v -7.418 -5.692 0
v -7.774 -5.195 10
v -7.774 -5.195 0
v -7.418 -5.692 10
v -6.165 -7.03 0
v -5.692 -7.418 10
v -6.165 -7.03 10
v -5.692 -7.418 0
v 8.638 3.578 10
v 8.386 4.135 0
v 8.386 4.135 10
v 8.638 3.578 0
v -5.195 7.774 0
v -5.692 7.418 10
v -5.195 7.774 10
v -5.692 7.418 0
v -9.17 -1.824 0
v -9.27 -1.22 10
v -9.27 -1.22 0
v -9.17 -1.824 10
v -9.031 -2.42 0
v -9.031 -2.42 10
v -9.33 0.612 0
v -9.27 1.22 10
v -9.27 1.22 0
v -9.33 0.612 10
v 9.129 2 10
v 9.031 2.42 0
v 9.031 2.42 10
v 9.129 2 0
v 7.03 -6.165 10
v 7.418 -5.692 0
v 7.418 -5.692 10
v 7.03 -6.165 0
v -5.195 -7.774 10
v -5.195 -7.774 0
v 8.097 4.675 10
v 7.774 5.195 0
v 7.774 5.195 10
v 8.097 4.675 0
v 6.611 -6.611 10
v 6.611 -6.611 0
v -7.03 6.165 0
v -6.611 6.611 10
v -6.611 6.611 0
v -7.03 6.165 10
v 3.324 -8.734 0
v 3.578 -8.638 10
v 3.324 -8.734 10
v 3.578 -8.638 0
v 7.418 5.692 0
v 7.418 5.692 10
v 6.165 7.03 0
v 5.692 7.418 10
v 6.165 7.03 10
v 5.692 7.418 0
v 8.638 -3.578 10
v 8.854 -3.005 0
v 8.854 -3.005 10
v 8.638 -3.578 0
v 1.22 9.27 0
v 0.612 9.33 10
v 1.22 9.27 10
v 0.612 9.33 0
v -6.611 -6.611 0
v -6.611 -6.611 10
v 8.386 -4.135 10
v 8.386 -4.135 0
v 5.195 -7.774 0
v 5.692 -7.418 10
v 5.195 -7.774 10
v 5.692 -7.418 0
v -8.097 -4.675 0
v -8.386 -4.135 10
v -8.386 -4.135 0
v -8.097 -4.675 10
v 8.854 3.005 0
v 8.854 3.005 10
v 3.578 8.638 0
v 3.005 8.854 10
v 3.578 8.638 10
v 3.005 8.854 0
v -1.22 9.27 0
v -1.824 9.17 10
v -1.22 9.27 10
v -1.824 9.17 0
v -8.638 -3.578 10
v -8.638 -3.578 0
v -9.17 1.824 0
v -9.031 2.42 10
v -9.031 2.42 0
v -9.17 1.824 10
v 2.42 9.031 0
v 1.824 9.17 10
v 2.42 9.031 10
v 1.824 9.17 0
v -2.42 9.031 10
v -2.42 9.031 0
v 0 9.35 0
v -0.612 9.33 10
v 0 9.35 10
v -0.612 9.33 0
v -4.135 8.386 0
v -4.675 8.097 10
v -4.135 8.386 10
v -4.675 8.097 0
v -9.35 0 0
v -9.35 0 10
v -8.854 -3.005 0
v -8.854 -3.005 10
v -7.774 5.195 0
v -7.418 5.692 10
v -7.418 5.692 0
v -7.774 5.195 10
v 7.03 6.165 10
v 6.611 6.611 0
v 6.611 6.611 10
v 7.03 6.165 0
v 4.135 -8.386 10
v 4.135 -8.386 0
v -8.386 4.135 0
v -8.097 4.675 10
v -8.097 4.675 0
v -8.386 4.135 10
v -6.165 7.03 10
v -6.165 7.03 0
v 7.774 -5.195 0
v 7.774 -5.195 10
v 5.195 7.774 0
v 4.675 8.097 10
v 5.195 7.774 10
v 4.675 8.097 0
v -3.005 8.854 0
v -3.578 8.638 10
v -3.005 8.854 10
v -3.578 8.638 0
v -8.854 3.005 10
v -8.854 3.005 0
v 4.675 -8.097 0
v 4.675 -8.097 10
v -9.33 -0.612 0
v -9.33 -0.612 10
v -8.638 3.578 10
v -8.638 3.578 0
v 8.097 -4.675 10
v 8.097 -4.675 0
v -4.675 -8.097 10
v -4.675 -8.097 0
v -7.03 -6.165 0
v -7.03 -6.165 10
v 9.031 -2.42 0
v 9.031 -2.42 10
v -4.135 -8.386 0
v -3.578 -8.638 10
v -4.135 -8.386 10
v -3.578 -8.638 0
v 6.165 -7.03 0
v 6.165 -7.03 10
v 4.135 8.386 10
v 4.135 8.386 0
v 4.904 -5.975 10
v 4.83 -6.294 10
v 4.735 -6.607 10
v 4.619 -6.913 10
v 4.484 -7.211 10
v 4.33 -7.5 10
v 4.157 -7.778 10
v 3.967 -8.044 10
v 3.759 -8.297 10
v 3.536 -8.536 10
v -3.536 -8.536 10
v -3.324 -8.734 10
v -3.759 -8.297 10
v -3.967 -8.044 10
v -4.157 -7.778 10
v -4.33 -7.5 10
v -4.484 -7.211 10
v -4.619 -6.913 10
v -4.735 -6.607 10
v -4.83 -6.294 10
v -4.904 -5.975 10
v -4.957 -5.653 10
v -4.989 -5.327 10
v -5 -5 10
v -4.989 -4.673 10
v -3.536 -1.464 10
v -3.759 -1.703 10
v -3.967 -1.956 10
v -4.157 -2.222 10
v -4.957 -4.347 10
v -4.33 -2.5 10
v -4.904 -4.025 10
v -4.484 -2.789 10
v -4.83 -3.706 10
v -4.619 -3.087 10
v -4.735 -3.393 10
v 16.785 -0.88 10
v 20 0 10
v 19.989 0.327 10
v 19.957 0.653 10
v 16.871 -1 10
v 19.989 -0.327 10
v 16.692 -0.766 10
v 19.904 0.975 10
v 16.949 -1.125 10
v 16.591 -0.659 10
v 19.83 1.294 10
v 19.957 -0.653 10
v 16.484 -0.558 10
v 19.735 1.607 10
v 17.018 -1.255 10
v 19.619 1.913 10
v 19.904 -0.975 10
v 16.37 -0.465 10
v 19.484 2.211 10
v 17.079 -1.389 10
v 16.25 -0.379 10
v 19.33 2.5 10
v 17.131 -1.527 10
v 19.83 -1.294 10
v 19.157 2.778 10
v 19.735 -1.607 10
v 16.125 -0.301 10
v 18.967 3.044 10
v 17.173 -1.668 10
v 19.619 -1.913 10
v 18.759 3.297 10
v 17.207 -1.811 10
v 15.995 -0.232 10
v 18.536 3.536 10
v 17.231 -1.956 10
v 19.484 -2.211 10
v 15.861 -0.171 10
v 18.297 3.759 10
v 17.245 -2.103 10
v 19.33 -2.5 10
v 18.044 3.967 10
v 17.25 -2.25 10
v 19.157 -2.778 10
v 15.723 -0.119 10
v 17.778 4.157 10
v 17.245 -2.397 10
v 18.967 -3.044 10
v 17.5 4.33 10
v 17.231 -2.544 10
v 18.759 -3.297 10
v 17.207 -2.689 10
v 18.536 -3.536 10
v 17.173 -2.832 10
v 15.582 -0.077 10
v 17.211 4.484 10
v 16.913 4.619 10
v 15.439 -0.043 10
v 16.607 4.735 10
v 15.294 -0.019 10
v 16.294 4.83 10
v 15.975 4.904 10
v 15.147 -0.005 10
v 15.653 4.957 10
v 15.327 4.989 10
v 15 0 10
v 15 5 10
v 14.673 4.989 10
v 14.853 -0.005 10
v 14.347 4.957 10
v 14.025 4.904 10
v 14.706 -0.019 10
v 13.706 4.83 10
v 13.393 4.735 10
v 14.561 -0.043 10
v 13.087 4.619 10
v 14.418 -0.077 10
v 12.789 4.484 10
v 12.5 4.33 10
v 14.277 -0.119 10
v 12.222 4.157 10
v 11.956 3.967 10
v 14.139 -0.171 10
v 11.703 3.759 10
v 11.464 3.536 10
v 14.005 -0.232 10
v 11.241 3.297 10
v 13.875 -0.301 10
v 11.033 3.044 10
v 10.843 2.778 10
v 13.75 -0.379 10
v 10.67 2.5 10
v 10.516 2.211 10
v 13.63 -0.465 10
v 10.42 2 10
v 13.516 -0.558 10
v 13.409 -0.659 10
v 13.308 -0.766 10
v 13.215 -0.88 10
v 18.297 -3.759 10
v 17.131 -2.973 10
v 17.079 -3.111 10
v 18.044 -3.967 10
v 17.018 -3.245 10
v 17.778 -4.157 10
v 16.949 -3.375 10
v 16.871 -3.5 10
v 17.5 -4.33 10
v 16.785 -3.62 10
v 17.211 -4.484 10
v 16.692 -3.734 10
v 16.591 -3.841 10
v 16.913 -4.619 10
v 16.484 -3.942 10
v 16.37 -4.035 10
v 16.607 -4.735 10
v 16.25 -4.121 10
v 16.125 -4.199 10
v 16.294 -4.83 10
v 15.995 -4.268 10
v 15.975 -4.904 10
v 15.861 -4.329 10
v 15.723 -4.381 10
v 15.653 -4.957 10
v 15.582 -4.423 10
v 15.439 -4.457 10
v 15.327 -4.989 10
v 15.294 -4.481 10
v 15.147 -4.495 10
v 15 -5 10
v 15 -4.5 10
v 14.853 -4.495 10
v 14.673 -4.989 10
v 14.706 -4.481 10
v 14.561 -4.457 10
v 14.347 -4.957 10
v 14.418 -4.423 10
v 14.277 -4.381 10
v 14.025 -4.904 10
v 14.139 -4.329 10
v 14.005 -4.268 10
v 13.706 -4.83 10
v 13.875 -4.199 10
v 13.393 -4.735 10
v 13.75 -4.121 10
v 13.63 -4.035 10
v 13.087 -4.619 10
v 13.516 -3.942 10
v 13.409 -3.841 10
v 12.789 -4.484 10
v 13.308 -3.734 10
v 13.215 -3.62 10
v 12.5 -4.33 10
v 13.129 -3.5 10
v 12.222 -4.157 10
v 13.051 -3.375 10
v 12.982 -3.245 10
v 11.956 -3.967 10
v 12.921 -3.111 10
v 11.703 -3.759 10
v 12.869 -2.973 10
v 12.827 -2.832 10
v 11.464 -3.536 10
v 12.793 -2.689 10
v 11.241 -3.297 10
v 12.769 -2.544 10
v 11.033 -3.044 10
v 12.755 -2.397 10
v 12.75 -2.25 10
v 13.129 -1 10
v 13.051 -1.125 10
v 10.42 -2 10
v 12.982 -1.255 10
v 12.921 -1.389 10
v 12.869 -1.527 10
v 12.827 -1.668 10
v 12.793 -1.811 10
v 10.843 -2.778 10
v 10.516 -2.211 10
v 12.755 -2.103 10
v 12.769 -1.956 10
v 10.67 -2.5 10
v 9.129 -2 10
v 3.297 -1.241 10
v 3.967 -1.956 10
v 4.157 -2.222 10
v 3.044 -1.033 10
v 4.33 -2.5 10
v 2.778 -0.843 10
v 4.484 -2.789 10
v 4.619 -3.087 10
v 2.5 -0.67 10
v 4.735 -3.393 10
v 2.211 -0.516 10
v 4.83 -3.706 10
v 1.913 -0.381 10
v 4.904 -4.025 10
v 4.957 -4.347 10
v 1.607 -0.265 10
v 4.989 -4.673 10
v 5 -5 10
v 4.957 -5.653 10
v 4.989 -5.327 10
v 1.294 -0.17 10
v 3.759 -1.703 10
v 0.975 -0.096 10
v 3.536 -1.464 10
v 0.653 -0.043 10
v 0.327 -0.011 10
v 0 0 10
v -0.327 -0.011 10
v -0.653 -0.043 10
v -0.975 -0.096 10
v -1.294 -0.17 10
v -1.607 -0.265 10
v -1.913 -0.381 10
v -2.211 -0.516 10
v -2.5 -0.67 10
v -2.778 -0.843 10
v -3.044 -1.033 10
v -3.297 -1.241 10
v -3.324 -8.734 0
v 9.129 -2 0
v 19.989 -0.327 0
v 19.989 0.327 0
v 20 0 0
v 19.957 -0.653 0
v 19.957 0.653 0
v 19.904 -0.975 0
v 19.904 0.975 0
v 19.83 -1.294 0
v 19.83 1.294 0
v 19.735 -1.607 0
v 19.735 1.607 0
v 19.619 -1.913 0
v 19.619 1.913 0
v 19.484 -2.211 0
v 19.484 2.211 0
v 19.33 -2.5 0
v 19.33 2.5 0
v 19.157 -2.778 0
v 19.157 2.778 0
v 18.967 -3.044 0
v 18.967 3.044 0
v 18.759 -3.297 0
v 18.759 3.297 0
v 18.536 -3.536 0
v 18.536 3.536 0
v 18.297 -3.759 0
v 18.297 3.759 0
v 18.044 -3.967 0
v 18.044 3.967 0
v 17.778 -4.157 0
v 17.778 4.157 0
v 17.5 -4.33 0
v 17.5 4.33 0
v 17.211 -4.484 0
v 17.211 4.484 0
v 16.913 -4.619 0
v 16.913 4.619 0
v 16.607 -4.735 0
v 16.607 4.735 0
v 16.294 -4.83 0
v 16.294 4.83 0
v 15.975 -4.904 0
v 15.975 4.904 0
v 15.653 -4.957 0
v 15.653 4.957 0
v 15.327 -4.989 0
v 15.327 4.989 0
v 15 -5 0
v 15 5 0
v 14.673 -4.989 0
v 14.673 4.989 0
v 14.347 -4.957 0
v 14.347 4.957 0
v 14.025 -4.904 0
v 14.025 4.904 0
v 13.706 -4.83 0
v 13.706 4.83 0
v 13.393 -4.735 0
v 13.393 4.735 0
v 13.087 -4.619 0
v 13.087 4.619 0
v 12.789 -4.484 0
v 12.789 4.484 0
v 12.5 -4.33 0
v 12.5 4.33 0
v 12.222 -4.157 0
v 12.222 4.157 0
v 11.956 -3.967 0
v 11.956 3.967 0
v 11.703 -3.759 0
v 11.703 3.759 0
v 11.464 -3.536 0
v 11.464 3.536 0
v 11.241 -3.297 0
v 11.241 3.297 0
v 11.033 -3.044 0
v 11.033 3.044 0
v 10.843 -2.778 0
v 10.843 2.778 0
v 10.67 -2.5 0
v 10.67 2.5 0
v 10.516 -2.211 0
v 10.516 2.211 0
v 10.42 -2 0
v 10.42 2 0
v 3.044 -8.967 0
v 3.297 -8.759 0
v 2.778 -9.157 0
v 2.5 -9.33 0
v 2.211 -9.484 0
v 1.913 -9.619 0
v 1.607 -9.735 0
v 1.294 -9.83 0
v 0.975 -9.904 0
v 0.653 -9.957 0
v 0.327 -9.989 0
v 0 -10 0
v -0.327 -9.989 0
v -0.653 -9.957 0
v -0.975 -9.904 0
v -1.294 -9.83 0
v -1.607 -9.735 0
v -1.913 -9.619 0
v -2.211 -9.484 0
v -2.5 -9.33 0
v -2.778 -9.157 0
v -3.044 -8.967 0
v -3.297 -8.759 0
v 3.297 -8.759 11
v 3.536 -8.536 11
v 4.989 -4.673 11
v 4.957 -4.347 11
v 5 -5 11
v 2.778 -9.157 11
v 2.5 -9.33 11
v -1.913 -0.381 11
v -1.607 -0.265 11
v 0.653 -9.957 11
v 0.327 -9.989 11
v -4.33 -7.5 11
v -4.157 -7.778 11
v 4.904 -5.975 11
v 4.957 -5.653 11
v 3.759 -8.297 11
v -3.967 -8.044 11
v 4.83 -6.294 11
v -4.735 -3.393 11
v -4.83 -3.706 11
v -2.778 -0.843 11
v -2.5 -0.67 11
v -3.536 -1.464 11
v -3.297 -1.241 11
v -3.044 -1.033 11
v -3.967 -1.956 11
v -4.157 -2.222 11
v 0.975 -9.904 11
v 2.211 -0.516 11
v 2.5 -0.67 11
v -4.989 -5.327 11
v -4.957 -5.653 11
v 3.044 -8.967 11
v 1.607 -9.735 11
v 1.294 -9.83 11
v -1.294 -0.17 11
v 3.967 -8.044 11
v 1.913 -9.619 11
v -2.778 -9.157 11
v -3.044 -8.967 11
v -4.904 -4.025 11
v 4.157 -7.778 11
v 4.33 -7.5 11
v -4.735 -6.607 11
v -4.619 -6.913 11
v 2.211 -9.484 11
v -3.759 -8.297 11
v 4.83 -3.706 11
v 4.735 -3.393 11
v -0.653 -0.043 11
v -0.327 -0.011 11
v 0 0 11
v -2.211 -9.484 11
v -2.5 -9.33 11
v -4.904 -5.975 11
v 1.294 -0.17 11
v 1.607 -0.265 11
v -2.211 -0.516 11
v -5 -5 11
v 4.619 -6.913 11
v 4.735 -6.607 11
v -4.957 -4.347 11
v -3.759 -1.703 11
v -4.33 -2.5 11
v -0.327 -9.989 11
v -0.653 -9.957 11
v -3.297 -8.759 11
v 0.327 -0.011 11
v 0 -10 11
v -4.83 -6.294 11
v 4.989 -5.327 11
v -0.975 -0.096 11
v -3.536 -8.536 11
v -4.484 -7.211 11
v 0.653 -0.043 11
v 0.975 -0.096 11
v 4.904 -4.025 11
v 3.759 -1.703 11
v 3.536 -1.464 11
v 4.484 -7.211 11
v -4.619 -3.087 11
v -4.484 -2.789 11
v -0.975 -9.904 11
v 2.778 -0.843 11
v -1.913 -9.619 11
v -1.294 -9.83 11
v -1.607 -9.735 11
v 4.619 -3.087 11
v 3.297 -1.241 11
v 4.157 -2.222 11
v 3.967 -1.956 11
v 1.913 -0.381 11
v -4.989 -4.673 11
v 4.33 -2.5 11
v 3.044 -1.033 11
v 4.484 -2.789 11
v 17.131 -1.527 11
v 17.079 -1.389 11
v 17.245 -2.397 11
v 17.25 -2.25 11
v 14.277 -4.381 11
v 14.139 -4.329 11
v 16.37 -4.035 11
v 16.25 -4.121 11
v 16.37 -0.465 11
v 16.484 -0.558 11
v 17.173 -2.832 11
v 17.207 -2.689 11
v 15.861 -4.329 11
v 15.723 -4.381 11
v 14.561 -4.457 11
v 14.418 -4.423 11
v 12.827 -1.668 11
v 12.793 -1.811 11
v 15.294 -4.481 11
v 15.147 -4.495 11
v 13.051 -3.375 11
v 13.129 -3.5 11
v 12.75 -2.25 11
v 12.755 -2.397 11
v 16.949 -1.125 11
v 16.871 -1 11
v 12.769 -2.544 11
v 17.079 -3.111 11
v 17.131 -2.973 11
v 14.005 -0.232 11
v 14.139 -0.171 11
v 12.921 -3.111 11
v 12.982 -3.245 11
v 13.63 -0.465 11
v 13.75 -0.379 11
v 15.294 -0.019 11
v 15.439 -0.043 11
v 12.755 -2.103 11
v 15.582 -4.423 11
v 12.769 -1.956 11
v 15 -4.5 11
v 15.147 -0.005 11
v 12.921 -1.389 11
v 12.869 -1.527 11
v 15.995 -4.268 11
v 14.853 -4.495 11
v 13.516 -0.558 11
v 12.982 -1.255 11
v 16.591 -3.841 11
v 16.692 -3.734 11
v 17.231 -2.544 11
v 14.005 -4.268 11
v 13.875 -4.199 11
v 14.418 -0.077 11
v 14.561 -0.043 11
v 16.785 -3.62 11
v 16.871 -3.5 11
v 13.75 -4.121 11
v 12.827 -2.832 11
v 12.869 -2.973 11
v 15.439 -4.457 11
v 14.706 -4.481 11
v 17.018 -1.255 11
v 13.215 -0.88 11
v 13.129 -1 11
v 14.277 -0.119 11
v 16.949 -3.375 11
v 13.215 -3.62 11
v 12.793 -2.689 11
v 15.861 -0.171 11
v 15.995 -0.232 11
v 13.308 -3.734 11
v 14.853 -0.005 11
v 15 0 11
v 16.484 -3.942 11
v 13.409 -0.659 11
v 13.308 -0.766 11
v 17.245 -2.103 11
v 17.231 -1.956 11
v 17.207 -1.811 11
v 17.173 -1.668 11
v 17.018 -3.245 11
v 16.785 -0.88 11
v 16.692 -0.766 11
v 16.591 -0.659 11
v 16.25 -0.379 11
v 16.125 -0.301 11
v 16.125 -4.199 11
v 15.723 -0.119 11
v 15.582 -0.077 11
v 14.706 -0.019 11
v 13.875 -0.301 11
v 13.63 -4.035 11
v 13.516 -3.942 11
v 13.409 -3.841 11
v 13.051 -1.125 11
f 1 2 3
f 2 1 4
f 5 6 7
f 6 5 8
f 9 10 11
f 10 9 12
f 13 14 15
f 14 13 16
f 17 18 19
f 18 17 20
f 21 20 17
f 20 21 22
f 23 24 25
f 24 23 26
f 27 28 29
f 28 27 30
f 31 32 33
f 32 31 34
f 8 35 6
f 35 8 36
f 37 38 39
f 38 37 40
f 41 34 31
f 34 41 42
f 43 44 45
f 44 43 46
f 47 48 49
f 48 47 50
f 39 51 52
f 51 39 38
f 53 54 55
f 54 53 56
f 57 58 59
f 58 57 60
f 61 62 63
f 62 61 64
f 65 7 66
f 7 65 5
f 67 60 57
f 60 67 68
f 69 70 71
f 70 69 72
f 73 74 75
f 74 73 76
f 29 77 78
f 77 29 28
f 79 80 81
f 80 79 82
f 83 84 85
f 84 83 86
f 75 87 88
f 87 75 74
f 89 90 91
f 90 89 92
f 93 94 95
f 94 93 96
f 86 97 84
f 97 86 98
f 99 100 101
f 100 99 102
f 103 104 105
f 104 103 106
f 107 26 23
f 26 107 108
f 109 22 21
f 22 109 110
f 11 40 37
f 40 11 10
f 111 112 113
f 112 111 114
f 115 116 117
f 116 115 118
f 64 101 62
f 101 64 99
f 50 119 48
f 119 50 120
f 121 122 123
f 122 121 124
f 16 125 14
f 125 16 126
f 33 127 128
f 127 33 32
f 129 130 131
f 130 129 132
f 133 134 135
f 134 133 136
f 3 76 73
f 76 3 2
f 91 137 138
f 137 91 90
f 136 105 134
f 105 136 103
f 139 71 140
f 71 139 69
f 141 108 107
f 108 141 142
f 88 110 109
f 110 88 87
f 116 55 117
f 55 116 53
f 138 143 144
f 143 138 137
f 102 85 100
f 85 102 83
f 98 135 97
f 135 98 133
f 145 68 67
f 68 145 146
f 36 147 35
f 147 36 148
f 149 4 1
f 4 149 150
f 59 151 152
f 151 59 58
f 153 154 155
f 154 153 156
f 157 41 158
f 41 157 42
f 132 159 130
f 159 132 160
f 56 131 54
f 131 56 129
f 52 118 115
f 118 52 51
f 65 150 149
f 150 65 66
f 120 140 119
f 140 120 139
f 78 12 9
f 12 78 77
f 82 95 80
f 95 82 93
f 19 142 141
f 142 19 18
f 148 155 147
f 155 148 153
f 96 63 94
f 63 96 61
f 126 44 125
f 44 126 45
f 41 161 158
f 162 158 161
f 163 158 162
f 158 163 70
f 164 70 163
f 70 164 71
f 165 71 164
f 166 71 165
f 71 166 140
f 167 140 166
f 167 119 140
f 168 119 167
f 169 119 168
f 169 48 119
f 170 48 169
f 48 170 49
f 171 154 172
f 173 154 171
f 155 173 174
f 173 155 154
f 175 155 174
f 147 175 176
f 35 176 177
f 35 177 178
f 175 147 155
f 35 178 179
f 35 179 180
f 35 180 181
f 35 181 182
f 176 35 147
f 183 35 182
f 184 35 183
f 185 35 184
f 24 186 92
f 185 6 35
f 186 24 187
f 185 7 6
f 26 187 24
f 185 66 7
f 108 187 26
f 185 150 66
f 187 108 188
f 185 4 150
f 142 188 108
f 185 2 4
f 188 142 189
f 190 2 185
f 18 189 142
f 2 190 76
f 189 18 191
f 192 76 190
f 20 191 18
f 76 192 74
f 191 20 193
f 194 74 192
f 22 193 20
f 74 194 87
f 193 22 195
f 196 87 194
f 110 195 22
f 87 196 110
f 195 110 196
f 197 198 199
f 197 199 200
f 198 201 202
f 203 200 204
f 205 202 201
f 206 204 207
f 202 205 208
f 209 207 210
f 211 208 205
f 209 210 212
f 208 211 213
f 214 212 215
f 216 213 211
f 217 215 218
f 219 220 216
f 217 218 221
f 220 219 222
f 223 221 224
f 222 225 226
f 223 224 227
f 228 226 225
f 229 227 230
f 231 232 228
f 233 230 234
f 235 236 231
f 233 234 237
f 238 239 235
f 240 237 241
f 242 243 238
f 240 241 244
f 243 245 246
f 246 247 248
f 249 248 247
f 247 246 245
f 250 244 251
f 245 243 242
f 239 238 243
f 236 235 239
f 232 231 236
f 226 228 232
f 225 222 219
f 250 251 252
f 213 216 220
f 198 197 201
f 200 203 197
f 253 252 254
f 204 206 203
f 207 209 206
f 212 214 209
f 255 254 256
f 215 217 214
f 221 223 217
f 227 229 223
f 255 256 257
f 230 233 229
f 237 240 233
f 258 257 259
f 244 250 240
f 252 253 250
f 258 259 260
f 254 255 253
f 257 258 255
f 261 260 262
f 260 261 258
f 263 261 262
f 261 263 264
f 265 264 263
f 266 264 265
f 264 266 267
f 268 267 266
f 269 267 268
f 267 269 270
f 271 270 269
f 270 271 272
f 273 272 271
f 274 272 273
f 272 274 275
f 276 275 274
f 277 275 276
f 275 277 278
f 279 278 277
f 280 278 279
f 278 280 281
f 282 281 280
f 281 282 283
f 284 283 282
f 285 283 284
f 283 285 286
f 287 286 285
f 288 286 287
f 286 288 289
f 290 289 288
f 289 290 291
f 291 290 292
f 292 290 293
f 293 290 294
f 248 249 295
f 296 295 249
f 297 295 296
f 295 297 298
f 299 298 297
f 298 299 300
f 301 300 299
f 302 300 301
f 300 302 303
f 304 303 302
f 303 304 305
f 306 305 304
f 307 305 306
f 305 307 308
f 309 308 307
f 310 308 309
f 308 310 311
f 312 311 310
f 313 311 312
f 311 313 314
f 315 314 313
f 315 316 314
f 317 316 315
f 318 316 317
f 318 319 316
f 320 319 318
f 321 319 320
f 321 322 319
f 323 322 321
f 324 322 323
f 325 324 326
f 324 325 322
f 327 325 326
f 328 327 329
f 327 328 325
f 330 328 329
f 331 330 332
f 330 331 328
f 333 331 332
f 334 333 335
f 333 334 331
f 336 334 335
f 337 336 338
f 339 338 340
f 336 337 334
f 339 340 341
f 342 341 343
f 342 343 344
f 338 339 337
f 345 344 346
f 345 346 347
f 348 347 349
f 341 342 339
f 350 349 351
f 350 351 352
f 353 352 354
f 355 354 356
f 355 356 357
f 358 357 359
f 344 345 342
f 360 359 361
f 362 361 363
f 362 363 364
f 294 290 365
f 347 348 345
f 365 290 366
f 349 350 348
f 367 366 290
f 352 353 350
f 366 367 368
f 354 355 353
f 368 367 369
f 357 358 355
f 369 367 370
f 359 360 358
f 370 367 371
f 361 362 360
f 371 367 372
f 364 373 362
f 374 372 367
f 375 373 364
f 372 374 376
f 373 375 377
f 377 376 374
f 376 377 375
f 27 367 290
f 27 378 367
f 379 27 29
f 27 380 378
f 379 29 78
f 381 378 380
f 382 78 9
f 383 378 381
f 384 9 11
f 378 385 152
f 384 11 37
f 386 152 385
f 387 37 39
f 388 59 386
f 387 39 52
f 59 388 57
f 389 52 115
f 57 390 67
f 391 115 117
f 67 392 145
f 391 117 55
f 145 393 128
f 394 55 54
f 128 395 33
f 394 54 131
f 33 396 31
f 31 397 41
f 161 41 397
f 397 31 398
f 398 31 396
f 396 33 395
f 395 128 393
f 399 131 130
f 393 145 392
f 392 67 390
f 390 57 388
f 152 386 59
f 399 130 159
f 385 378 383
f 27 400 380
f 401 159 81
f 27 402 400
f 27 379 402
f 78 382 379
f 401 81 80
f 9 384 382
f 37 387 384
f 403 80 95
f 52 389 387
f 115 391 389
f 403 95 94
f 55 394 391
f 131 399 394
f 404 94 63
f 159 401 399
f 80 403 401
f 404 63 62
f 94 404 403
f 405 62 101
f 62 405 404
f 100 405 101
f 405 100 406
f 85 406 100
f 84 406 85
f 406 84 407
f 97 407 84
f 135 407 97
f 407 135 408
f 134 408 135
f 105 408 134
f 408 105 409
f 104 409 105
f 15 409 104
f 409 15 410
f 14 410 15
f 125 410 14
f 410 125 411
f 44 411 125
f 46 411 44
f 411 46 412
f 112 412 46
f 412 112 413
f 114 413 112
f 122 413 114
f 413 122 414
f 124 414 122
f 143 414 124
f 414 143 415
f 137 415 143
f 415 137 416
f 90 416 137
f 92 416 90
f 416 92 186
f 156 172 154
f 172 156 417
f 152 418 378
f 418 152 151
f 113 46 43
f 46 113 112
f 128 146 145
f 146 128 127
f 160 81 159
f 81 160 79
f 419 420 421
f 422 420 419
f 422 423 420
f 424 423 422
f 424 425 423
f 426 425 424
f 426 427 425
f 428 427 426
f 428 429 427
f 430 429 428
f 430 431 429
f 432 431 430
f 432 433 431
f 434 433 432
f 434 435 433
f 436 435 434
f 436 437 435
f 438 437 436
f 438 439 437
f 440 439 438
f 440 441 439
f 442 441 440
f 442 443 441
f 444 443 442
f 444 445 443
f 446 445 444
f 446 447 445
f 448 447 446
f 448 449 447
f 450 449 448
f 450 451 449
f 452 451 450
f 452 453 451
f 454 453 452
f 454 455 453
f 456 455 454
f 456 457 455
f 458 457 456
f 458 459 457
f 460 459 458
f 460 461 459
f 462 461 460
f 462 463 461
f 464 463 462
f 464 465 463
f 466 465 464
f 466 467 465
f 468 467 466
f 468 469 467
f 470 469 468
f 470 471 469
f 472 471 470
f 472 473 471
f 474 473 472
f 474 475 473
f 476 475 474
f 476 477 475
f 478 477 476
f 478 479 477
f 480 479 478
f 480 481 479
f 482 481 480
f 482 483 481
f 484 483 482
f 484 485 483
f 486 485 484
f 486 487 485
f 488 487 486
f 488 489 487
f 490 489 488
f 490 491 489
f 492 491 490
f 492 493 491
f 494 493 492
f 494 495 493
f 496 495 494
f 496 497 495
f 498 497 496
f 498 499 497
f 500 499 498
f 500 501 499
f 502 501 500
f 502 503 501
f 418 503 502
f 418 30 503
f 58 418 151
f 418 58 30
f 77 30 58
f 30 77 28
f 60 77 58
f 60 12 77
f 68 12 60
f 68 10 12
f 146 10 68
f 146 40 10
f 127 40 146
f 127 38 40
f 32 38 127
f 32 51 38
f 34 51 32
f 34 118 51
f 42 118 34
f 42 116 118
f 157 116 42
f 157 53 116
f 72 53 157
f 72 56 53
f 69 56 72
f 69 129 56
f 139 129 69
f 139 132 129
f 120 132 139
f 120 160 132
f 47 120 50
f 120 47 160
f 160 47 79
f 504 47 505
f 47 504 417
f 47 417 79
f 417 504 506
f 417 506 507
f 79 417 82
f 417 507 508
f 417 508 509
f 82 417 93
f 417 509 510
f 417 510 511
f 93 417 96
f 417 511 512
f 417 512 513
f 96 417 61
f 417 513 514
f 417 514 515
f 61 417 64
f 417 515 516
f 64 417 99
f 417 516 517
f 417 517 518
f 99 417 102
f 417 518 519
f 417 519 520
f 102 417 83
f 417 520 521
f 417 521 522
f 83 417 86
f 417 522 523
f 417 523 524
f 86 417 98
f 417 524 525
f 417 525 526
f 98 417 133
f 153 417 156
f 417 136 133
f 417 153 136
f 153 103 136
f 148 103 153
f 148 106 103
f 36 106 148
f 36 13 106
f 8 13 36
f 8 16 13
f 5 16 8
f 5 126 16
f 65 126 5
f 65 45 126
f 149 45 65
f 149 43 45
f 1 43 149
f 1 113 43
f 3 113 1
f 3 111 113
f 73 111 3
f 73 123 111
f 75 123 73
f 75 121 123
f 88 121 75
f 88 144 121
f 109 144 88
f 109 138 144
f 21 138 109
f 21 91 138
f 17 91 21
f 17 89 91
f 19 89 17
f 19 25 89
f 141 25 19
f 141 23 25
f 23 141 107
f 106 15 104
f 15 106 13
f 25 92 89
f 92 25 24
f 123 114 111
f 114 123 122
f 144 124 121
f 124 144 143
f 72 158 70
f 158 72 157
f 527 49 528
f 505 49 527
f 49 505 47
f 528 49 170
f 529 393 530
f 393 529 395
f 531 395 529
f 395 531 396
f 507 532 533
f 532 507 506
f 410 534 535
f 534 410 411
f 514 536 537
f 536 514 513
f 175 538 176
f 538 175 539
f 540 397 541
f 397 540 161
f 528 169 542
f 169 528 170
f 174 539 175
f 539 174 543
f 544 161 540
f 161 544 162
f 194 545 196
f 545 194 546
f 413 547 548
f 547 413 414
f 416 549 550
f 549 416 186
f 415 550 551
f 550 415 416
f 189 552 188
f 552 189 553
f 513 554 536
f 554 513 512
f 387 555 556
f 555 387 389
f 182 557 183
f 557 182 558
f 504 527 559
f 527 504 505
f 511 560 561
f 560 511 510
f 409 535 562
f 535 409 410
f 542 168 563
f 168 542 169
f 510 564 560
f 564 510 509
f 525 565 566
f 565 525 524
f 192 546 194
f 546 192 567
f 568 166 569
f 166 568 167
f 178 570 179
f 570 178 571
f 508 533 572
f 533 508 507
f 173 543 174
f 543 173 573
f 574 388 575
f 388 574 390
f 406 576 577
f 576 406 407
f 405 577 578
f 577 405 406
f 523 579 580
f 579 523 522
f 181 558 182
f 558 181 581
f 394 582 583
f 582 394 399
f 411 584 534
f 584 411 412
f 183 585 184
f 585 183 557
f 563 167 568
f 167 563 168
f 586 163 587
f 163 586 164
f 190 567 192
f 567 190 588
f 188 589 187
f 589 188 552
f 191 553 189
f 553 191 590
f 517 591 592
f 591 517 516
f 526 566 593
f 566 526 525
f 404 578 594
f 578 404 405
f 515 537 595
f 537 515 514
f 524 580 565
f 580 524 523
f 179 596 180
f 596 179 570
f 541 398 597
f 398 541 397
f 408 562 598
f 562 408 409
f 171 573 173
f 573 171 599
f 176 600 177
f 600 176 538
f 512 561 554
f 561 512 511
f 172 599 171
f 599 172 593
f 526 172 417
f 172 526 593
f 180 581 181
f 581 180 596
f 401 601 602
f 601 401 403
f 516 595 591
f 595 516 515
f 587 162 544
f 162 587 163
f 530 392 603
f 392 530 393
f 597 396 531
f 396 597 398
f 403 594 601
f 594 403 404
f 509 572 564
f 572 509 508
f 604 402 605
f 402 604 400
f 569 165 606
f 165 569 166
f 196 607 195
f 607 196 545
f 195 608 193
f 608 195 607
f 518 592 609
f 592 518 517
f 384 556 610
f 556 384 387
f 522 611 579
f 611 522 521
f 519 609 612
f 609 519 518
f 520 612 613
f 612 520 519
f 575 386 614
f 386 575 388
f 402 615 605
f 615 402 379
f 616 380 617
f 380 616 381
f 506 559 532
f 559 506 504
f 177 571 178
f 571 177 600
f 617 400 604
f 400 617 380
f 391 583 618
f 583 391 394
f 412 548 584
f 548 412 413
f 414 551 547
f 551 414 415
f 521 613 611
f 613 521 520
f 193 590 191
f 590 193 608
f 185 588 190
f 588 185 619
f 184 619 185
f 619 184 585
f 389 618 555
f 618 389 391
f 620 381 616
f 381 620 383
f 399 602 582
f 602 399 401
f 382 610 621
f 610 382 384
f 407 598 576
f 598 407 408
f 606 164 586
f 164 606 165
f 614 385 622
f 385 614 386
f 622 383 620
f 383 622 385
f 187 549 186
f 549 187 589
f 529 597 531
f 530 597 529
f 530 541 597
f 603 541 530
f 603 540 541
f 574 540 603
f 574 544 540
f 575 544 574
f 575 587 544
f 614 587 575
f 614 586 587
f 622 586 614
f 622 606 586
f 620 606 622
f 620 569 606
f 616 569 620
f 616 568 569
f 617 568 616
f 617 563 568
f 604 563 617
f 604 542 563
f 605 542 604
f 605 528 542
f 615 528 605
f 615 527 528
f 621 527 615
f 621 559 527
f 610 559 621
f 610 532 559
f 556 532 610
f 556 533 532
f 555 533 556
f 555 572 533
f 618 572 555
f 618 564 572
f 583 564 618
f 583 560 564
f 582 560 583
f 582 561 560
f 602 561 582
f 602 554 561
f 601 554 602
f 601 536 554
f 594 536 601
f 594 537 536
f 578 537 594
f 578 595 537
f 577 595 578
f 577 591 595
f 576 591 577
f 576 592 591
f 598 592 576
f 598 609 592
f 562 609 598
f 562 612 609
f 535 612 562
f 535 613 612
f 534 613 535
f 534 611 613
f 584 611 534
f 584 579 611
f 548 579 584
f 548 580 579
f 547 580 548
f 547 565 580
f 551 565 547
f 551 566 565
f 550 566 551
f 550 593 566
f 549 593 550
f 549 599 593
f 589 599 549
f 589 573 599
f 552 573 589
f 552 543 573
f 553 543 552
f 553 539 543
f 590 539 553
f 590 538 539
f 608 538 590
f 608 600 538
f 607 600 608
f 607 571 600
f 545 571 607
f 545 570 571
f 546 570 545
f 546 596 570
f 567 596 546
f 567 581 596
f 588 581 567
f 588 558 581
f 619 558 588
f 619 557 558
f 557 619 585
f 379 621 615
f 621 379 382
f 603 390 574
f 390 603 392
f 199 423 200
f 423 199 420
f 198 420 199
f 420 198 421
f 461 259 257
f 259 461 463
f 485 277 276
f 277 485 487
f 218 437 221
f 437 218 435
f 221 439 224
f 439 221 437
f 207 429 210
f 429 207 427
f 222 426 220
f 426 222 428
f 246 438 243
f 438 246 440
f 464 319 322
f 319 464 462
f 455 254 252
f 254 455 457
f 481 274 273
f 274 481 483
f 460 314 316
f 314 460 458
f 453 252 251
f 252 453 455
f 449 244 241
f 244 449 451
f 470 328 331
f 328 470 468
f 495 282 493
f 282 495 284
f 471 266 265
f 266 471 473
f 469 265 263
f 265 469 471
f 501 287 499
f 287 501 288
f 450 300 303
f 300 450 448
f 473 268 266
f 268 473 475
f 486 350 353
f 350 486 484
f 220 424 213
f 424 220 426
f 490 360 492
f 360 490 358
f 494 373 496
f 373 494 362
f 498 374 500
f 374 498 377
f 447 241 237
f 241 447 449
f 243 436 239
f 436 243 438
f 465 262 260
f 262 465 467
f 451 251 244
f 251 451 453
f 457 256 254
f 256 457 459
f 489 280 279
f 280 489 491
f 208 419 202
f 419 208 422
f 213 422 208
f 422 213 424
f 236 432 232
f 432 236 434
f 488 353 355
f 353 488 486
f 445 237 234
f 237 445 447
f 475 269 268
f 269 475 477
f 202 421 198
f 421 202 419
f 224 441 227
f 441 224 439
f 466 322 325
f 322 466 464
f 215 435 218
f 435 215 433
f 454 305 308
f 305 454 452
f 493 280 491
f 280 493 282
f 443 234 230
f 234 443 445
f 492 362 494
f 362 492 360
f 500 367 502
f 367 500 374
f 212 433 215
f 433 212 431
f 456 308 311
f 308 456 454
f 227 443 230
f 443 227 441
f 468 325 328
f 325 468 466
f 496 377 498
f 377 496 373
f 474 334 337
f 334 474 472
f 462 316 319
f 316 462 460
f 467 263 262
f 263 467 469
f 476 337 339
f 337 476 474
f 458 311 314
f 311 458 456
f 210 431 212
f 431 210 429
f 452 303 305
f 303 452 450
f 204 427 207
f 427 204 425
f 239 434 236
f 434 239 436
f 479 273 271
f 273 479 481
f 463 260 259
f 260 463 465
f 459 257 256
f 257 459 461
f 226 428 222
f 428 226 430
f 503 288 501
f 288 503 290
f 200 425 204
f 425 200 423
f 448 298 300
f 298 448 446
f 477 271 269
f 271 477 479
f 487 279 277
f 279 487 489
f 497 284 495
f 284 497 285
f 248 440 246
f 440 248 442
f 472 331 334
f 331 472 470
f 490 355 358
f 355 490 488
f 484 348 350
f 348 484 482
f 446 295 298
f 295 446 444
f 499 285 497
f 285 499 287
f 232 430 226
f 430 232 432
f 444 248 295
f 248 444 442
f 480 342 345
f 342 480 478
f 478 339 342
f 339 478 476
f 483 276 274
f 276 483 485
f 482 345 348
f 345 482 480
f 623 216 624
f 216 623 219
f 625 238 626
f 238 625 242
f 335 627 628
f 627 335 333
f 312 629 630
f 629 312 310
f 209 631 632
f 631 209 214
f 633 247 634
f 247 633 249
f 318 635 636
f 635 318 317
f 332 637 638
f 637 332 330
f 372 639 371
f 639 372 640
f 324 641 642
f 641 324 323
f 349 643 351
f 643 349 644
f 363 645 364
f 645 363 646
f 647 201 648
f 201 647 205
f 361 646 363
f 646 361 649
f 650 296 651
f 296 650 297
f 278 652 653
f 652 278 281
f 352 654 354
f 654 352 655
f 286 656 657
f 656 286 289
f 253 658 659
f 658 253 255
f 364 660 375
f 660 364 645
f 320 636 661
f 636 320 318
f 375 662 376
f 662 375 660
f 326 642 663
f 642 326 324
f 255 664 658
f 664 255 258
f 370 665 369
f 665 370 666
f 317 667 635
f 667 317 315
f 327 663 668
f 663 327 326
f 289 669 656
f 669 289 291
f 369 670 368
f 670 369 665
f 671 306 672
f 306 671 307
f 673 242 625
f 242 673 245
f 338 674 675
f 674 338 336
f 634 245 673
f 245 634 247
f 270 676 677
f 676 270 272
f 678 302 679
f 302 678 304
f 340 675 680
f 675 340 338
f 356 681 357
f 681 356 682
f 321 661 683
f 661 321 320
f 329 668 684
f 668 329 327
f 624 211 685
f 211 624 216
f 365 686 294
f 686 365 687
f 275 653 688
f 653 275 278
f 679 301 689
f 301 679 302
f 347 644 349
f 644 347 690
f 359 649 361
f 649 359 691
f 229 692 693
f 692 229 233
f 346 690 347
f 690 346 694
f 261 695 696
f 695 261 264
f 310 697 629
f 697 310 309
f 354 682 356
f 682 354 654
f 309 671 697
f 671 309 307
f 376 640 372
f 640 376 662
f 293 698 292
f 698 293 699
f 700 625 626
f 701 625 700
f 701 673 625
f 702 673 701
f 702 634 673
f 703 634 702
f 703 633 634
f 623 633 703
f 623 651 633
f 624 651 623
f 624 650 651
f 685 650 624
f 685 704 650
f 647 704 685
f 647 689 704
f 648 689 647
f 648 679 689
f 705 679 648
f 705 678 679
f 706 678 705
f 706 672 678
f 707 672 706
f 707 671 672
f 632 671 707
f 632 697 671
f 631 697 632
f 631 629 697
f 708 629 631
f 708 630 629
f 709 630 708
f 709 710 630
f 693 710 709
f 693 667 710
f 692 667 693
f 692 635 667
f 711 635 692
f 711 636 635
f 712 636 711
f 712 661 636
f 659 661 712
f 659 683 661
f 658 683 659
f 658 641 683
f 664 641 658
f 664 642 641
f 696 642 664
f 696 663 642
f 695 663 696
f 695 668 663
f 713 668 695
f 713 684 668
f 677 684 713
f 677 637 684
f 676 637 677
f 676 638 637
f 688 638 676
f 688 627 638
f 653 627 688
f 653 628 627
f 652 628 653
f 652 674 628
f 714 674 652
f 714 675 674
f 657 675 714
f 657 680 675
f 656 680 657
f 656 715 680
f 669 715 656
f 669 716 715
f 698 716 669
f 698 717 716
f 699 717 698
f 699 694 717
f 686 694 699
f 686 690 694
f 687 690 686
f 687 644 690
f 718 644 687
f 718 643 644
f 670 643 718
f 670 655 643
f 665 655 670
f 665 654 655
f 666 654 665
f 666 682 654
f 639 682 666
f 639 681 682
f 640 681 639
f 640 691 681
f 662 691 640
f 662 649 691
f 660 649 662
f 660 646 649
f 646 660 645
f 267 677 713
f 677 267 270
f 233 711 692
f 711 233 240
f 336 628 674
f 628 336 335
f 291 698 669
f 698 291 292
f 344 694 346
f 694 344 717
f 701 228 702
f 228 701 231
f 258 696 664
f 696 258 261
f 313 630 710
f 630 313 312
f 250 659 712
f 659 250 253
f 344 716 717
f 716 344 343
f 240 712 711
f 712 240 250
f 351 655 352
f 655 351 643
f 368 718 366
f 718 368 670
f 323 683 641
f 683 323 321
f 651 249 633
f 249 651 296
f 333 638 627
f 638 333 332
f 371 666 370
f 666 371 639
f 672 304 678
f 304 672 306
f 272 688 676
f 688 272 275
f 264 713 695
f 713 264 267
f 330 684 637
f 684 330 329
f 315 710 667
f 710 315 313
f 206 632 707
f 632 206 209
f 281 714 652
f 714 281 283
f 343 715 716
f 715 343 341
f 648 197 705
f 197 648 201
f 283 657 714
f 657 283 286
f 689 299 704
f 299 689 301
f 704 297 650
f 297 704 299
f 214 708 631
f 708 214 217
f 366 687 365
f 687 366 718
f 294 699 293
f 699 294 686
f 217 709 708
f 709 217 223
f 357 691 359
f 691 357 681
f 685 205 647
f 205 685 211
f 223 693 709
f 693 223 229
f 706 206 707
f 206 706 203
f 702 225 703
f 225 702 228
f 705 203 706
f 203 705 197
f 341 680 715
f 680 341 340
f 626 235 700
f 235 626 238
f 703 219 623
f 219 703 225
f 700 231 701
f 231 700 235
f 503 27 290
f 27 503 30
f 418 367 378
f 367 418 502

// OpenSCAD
// Tubing organiser clip for a 12.7 mm lab stand rod
// Print orientation: flat on the bed, z = 0 up to z = 10

// ---------------- Parameters ----------------
ring_d      = 12.7;   // rod ring inner diameter (stand rod)
ring_w      = 3;      // rod ring wall thickness
ring_o      = ring_d + 2 * ring_w;  // rod ring outer diameter (18.7)

opening_x   = 0;      // rod ring opening lies on the -X side
opening_w   = 10;     // rod ring opening width (y extent)

tub_d       = 6;      // tubing ring inner diameter
tub_w       = 2;      // tubing ring wall thickness
tub_o       = tub_d + 2 * tub_w;    // tubing ring outer diameter (10)

tub_x       = 15;     // tubing ring centre X position
tub_open_w  = 4.5;    // tubing ring opening width on the +X side

bridge_x0   = 8;      // bridge start X
bridge_x1   = 12;     // bridge end X
bridge_w    = bridge_x1 - bridge_x0;  // bridge width (Y) = 6

eps         = 0.5;    // cutter overshoot past faces
$fn         = 96;     // curve resolution

// ---------------- Model ----------------
difference() {
    union() {
        // Rod ring: centred at origin, opening on -X
        cylinder(d = ring_o, h = 10);
        translate([opening_x, -opening_w / 2, 0])
            linear_extrude(height = 10 + 2 * eps)
                circle(d = opening_w);

        // Tubing ring: centred at x = 15, opening on +X
        translate([tub_x, 0, 0])
            cylinder(d = tub_o, h = 10);
        translate([tub_x, -tub_open_w / 2, 0])
            linear_extrude(height = 10 + 2 * eps)
                circle(d = tub_open_w);

        // Solid bridge between the two rings (y = -3 to +3)
        translate([bridge_x0, -bridge_w / 2, 0])
            cube([bridge_w, bridge_w, 10]);
    }
}
